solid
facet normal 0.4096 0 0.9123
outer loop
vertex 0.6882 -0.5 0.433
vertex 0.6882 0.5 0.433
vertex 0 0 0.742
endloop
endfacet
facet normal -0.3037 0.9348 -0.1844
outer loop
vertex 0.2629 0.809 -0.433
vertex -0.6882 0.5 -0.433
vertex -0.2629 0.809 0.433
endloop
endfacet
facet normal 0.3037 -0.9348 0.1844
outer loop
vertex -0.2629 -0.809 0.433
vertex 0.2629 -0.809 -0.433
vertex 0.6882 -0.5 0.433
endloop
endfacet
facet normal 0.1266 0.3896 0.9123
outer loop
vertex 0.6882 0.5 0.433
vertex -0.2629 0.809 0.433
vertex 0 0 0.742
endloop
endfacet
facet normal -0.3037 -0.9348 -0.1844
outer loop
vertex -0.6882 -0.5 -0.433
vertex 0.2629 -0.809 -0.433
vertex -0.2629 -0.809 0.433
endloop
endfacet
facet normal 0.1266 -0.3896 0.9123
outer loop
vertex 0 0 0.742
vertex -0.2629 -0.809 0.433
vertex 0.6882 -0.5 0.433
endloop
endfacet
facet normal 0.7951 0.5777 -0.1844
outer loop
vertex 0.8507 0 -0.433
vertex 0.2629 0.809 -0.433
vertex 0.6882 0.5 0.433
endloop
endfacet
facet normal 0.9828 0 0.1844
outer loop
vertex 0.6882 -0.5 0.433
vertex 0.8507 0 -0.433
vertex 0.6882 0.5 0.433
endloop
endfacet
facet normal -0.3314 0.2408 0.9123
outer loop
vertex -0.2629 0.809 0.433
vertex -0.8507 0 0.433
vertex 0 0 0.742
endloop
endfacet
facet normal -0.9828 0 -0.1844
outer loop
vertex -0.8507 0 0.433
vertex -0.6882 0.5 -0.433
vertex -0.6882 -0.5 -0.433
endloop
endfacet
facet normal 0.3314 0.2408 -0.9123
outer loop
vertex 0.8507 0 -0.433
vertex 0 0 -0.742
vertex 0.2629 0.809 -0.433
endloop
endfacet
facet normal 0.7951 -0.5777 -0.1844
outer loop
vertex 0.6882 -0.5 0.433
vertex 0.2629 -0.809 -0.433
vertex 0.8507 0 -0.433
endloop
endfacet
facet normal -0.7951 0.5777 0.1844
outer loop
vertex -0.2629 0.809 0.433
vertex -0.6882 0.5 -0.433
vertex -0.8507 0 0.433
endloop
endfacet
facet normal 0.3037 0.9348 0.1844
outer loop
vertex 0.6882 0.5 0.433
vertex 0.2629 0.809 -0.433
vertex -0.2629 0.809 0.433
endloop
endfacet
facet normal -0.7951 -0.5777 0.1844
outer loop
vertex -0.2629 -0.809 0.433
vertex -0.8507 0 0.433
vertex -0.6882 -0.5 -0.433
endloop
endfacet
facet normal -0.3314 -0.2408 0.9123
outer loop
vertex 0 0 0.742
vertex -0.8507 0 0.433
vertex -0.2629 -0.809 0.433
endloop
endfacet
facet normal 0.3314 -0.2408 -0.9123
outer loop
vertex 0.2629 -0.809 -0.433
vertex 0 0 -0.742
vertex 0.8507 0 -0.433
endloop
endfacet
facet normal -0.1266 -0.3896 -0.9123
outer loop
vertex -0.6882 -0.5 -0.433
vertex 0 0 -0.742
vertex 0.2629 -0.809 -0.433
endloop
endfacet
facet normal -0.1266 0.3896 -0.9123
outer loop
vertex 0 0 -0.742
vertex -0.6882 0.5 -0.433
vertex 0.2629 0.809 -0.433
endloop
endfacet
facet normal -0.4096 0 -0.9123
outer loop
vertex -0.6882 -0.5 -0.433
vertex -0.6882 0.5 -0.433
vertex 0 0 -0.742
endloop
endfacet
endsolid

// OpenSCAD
height = sin (54) * tan (acos (sin (54) * 2 / sqrt (3)));
// radius = height / (tan (asin (height)));
big_radius = 1 / (2 * sin (36));
small_radius = sqrt (pow (big_radius, 2) - (1/4));
//side_height = sqrt (3) / 2 * sin (acos (height * (1 - sin (54))));
//side_height = sqrt ((3/4) - pow((big_radius - small_radius), 2));
side_height = sqrt (3) / 2;
turn = 72;
rotation_axis = [0, 0, 1];

module wedge (x) {
    turn = 72;

    one = [1, 0, 0];
    top_points = [
	big_radius * [sin (54), cos (54), 0],
	big_radius * [sin (54), -cos (54), 0],
	[0, 0, 0],
	[0, 0, height]
    ];
    top_faces = [
	[3, 0, 1],
	[3, 2, 0],
	[3, 1, 2],
	[2, 1, 0]
    ];
    polyhedron (
	points = top_points,
	faces = top_faces
    );
}

module top (x) {
    echo (side_height);
    translate ([0, 0, side_height] / 2) {
	union () {
	    wedge (x);
	    rotate (a = turn, v = rotation_axis) { wedge (x); };
	    rotate (a = 2 * turn, v = rotation_axis) { wedge (x); };
	    rotate (a = 3 * turn, v = rotation_axis) { wedge (x); };
	    rotate (a = 4 * turn, v = rotation_axis) { wedge (x); };
	}
    }
}

module bottom (x) {
    rotate (a = turn/2, v = rotation_axis) {
	mirror ([0, 0, 1]) {
	    top (x);
	}
    }
}

hull () {
    top (2);
    bottom (2);
};
